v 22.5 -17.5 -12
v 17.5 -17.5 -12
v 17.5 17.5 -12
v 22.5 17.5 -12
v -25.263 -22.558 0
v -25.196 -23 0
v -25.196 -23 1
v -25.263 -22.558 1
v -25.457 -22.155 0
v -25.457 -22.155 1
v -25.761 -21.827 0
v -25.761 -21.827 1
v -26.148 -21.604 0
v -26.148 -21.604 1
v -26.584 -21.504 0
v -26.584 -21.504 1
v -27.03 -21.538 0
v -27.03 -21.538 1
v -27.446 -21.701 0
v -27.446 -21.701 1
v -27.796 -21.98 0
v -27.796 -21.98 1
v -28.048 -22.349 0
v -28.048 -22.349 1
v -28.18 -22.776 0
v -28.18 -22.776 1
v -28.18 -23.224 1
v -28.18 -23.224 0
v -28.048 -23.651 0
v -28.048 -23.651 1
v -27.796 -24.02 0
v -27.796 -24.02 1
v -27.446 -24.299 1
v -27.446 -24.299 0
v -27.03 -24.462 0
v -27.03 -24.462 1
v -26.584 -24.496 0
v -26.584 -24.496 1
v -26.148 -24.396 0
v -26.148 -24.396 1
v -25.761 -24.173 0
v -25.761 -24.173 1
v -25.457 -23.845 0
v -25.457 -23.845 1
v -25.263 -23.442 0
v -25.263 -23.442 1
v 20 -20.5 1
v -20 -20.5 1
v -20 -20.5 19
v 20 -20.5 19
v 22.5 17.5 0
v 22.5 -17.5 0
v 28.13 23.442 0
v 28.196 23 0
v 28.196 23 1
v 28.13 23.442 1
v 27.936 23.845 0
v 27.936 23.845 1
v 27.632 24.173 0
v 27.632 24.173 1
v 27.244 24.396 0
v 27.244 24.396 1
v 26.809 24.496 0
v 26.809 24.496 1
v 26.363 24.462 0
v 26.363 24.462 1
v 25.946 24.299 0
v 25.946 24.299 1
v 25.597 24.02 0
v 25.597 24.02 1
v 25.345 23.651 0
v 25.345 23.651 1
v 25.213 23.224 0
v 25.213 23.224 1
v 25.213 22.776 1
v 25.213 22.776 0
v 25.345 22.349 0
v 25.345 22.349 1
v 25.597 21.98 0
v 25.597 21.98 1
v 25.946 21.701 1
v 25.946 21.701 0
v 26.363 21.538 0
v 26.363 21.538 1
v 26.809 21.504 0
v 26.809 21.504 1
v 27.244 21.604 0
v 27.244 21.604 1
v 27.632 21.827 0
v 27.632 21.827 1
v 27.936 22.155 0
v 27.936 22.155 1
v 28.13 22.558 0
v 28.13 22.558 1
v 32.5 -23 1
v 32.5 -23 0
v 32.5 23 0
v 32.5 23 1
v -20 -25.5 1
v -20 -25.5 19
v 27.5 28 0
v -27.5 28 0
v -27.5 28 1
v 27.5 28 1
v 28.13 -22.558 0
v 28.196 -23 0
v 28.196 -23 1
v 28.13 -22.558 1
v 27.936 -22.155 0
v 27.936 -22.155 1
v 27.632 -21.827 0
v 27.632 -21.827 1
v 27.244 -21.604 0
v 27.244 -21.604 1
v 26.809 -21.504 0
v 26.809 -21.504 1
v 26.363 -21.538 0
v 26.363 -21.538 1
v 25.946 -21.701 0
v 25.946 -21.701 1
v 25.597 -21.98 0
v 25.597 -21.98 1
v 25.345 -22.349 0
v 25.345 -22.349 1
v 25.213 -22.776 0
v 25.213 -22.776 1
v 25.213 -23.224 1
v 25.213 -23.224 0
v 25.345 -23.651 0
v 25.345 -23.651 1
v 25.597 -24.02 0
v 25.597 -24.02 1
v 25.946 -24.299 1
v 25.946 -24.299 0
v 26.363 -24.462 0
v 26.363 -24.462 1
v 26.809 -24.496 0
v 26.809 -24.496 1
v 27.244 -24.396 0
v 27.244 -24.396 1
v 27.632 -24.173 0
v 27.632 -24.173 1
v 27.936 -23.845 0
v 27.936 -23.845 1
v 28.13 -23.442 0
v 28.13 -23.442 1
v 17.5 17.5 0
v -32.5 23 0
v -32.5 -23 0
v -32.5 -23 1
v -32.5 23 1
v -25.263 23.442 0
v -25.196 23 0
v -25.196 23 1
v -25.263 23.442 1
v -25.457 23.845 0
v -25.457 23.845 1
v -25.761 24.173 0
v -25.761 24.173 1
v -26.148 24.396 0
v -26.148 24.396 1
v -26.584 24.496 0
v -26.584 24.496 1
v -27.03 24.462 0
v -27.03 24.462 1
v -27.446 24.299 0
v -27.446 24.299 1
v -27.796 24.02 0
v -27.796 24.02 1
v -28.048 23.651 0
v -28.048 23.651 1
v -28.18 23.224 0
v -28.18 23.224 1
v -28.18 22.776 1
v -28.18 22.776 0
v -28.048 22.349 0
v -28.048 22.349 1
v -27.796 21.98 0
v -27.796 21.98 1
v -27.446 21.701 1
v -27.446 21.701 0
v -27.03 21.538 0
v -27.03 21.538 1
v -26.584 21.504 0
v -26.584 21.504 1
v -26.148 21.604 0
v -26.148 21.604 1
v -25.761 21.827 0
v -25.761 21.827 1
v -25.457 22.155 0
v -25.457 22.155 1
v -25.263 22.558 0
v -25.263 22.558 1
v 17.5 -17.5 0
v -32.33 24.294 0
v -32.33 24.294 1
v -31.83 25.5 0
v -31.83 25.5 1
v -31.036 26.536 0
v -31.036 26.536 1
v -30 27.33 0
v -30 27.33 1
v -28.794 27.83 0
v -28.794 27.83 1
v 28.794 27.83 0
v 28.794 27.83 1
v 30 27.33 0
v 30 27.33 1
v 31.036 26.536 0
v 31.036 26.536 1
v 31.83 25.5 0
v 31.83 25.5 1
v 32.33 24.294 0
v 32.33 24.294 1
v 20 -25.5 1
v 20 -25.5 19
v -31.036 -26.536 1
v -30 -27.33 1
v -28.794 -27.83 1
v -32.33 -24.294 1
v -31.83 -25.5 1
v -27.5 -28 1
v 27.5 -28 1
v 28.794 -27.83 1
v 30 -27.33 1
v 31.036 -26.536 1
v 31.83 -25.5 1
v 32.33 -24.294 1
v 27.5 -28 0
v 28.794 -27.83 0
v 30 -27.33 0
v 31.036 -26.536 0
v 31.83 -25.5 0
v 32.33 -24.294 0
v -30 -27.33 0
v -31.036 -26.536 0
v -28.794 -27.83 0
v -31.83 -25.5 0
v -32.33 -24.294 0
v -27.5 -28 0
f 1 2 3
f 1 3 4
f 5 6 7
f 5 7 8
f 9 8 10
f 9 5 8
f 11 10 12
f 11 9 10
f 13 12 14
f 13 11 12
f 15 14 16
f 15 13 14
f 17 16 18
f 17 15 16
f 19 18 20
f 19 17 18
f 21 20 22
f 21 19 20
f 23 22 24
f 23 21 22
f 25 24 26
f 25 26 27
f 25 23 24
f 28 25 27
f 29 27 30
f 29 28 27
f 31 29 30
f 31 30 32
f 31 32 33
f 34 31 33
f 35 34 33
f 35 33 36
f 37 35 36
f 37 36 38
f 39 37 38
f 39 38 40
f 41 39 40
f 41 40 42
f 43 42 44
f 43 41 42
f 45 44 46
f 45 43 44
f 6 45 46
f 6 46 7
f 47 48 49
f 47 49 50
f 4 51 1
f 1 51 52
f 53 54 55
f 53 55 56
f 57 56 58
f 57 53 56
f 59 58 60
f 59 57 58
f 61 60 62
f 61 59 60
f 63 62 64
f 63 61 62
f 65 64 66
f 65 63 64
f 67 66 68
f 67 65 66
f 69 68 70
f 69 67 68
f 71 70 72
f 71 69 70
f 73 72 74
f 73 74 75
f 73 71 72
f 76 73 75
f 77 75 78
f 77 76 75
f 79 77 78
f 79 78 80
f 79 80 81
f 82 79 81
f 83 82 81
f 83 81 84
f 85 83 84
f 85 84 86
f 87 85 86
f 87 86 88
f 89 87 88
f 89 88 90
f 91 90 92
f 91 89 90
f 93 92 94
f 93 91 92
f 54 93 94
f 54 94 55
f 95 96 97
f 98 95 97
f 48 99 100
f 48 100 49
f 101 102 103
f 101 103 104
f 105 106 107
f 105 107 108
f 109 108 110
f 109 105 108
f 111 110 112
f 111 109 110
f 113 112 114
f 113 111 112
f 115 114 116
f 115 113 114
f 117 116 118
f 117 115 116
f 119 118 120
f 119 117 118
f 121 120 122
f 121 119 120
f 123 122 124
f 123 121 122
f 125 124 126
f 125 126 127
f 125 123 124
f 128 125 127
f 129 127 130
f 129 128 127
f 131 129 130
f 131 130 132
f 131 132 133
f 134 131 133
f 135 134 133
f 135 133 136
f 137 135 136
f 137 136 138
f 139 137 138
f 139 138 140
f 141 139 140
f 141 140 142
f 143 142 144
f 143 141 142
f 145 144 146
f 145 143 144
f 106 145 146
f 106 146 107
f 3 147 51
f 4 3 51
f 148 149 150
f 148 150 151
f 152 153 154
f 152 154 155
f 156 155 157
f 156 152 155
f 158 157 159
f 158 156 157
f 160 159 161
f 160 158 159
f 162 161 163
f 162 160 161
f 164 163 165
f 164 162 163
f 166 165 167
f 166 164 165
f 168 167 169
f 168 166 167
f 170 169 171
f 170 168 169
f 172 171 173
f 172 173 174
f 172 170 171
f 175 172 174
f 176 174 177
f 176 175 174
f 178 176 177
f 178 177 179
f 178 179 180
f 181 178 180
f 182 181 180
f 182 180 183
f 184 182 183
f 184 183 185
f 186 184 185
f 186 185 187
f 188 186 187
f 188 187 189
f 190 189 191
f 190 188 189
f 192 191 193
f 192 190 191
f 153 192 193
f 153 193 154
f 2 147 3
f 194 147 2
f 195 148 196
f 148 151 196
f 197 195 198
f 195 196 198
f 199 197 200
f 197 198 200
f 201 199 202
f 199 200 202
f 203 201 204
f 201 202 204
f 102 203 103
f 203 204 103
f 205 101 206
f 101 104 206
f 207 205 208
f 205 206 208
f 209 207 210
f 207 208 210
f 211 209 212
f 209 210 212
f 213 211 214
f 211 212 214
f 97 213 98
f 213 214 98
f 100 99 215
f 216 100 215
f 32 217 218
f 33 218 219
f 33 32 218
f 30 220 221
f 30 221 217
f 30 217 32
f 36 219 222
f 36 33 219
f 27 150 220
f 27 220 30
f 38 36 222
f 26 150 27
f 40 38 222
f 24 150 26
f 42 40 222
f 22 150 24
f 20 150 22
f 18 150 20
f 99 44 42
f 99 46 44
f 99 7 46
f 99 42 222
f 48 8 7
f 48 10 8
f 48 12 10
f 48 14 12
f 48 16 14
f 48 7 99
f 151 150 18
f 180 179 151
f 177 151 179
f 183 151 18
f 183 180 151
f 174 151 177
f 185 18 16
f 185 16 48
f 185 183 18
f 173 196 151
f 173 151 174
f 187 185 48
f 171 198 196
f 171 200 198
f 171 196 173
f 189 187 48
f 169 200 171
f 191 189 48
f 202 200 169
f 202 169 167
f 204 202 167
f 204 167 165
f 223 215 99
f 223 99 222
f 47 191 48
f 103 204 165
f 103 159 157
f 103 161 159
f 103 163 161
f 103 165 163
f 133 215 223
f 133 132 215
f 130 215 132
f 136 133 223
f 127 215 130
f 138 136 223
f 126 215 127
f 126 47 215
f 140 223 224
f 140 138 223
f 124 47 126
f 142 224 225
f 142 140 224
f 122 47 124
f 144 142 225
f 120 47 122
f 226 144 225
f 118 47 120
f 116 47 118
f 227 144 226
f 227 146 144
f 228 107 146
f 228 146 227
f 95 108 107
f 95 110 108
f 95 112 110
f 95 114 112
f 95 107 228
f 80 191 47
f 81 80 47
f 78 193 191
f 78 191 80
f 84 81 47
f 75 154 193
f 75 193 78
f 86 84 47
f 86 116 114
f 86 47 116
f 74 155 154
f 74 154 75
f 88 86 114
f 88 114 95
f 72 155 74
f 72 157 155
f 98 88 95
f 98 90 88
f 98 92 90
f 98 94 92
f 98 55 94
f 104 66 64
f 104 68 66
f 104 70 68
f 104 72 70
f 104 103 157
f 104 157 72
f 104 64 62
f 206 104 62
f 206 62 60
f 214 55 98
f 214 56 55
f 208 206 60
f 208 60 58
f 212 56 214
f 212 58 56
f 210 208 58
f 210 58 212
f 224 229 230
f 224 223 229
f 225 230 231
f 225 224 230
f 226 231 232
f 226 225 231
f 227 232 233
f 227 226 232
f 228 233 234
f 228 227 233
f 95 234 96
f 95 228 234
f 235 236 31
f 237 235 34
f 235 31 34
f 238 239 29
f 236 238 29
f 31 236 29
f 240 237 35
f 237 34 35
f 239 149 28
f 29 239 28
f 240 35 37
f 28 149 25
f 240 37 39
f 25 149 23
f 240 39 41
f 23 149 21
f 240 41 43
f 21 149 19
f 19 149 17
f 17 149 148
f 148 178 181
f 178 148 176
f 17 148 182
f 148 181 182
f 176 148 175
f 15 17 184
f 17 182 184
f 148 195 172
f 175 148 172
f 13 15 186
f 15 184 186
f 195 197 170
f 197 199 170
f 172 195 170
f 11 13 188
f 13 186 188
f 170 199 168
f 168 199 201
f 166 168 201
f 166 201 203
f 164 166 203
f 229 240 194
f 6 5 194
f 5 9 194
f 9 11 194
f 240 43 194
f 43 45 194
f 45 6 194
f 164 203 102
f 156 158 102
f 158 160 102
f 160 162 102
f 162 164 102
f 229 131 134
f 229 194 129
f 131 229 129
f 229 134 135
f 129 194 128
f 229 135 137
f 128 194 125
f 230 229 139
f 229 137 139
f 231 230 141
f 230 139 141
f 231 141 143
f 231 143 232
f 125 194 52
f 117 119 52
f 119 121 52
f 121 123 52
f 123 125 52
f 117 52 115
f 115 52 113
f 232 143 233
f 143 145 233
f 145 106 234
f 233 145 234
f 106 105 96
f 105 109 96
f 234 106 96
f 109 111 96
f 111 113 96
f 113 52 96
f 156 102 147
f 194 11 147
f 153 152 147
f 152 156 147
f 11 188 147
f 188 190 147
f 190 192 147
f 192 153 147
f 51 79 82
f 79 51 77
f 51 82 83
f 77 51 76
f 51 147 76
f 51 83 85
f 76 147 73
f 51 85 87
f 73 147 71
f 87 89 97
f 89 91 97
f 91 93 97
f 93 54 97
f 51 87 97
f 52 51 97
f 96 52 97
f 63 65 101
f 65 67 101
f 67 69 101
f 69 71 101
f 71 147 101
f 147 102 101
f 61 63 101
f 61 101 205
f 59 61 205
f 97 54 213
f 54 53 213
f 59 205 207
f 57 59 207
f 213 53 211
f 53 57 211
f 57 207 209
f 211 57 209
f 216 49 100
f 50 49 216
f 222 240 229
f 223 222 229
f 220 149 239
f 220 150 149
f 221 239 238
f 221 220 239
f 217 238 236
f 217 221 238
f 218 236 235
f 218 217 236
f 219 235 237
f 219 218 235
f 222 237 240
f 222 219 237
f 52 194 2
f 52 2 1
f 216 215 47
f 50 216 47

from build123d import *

# Parameters (mm, degrees)
SKETCH_W     = 65
SKETCH_H     = 56
SKETCH_R     = 1.5
PAD_DEPTH    = 1
FILLET_R     = 5
SKETCH001_W  = 40
SKETCH001_H  = 5
PAD001_DEPTH = 18
SKETCH002_W  = 5
SKETCH002_H  = 35
PAD002_DEPTH = 12


with BuildPart() as part:
    # Sketch → Pad (new body)
    with BuildSketch(Plane.XY):
        Rectangle(SKETCH_W, SKETCH_H)
        with Locations((-26.696429, 23)):
            Circle(SKETCH_R, mode=Mode.SUBTRACT)
        with Locations((-26.696429, -23)):
            Circle(SKETCH_R, mode=Mode.SUBTRACT)
        with Locations((26.696429, -23)):
            Circle(SKETCH_R, mode=Mode.SUBTRACT)
        with Locations((26.696429, 23)):
            Circle(SKETCH_R, mode=Mode.SUBTRACT)
    extrude(amount=PAD_DEPTH)

    # Fillet
    fillet_edges = [part.edges().sort_by_distance(p)[0] for p in [
        (-32.5, -28, 0.5),
        (32.5, -28, 0.5),
        (32.5, 28, 0.5),
        (-32.5, 28, 0.5),
    ]]
    fillet(fillet_edges, radius=FILLET_R)

    # Sketch001 (on Face5 of Fillet) → Pad001 (join)
    with BuildSketch(Plane.XY.offset(1)):
        with Locations((0, -23)):
            Rectangle(SKETCH001_W, SKETCH001_H)
    extrude(amount=PAD001_DEPTH)

    # Sketch002 (on Face2 of Pad001) → Pad002 (join)
    with BuildSketch(Plane(origin=(0, 0, 0), x_dir=(1, 0, 0), z_dir=(0, 0, -1))):
        with Locations((20, 0)):
            Rectangle(SKETCH002_W, SKETCH002_H)
    extrude(amount=PAD002_DEPTH)


solid = part.part
